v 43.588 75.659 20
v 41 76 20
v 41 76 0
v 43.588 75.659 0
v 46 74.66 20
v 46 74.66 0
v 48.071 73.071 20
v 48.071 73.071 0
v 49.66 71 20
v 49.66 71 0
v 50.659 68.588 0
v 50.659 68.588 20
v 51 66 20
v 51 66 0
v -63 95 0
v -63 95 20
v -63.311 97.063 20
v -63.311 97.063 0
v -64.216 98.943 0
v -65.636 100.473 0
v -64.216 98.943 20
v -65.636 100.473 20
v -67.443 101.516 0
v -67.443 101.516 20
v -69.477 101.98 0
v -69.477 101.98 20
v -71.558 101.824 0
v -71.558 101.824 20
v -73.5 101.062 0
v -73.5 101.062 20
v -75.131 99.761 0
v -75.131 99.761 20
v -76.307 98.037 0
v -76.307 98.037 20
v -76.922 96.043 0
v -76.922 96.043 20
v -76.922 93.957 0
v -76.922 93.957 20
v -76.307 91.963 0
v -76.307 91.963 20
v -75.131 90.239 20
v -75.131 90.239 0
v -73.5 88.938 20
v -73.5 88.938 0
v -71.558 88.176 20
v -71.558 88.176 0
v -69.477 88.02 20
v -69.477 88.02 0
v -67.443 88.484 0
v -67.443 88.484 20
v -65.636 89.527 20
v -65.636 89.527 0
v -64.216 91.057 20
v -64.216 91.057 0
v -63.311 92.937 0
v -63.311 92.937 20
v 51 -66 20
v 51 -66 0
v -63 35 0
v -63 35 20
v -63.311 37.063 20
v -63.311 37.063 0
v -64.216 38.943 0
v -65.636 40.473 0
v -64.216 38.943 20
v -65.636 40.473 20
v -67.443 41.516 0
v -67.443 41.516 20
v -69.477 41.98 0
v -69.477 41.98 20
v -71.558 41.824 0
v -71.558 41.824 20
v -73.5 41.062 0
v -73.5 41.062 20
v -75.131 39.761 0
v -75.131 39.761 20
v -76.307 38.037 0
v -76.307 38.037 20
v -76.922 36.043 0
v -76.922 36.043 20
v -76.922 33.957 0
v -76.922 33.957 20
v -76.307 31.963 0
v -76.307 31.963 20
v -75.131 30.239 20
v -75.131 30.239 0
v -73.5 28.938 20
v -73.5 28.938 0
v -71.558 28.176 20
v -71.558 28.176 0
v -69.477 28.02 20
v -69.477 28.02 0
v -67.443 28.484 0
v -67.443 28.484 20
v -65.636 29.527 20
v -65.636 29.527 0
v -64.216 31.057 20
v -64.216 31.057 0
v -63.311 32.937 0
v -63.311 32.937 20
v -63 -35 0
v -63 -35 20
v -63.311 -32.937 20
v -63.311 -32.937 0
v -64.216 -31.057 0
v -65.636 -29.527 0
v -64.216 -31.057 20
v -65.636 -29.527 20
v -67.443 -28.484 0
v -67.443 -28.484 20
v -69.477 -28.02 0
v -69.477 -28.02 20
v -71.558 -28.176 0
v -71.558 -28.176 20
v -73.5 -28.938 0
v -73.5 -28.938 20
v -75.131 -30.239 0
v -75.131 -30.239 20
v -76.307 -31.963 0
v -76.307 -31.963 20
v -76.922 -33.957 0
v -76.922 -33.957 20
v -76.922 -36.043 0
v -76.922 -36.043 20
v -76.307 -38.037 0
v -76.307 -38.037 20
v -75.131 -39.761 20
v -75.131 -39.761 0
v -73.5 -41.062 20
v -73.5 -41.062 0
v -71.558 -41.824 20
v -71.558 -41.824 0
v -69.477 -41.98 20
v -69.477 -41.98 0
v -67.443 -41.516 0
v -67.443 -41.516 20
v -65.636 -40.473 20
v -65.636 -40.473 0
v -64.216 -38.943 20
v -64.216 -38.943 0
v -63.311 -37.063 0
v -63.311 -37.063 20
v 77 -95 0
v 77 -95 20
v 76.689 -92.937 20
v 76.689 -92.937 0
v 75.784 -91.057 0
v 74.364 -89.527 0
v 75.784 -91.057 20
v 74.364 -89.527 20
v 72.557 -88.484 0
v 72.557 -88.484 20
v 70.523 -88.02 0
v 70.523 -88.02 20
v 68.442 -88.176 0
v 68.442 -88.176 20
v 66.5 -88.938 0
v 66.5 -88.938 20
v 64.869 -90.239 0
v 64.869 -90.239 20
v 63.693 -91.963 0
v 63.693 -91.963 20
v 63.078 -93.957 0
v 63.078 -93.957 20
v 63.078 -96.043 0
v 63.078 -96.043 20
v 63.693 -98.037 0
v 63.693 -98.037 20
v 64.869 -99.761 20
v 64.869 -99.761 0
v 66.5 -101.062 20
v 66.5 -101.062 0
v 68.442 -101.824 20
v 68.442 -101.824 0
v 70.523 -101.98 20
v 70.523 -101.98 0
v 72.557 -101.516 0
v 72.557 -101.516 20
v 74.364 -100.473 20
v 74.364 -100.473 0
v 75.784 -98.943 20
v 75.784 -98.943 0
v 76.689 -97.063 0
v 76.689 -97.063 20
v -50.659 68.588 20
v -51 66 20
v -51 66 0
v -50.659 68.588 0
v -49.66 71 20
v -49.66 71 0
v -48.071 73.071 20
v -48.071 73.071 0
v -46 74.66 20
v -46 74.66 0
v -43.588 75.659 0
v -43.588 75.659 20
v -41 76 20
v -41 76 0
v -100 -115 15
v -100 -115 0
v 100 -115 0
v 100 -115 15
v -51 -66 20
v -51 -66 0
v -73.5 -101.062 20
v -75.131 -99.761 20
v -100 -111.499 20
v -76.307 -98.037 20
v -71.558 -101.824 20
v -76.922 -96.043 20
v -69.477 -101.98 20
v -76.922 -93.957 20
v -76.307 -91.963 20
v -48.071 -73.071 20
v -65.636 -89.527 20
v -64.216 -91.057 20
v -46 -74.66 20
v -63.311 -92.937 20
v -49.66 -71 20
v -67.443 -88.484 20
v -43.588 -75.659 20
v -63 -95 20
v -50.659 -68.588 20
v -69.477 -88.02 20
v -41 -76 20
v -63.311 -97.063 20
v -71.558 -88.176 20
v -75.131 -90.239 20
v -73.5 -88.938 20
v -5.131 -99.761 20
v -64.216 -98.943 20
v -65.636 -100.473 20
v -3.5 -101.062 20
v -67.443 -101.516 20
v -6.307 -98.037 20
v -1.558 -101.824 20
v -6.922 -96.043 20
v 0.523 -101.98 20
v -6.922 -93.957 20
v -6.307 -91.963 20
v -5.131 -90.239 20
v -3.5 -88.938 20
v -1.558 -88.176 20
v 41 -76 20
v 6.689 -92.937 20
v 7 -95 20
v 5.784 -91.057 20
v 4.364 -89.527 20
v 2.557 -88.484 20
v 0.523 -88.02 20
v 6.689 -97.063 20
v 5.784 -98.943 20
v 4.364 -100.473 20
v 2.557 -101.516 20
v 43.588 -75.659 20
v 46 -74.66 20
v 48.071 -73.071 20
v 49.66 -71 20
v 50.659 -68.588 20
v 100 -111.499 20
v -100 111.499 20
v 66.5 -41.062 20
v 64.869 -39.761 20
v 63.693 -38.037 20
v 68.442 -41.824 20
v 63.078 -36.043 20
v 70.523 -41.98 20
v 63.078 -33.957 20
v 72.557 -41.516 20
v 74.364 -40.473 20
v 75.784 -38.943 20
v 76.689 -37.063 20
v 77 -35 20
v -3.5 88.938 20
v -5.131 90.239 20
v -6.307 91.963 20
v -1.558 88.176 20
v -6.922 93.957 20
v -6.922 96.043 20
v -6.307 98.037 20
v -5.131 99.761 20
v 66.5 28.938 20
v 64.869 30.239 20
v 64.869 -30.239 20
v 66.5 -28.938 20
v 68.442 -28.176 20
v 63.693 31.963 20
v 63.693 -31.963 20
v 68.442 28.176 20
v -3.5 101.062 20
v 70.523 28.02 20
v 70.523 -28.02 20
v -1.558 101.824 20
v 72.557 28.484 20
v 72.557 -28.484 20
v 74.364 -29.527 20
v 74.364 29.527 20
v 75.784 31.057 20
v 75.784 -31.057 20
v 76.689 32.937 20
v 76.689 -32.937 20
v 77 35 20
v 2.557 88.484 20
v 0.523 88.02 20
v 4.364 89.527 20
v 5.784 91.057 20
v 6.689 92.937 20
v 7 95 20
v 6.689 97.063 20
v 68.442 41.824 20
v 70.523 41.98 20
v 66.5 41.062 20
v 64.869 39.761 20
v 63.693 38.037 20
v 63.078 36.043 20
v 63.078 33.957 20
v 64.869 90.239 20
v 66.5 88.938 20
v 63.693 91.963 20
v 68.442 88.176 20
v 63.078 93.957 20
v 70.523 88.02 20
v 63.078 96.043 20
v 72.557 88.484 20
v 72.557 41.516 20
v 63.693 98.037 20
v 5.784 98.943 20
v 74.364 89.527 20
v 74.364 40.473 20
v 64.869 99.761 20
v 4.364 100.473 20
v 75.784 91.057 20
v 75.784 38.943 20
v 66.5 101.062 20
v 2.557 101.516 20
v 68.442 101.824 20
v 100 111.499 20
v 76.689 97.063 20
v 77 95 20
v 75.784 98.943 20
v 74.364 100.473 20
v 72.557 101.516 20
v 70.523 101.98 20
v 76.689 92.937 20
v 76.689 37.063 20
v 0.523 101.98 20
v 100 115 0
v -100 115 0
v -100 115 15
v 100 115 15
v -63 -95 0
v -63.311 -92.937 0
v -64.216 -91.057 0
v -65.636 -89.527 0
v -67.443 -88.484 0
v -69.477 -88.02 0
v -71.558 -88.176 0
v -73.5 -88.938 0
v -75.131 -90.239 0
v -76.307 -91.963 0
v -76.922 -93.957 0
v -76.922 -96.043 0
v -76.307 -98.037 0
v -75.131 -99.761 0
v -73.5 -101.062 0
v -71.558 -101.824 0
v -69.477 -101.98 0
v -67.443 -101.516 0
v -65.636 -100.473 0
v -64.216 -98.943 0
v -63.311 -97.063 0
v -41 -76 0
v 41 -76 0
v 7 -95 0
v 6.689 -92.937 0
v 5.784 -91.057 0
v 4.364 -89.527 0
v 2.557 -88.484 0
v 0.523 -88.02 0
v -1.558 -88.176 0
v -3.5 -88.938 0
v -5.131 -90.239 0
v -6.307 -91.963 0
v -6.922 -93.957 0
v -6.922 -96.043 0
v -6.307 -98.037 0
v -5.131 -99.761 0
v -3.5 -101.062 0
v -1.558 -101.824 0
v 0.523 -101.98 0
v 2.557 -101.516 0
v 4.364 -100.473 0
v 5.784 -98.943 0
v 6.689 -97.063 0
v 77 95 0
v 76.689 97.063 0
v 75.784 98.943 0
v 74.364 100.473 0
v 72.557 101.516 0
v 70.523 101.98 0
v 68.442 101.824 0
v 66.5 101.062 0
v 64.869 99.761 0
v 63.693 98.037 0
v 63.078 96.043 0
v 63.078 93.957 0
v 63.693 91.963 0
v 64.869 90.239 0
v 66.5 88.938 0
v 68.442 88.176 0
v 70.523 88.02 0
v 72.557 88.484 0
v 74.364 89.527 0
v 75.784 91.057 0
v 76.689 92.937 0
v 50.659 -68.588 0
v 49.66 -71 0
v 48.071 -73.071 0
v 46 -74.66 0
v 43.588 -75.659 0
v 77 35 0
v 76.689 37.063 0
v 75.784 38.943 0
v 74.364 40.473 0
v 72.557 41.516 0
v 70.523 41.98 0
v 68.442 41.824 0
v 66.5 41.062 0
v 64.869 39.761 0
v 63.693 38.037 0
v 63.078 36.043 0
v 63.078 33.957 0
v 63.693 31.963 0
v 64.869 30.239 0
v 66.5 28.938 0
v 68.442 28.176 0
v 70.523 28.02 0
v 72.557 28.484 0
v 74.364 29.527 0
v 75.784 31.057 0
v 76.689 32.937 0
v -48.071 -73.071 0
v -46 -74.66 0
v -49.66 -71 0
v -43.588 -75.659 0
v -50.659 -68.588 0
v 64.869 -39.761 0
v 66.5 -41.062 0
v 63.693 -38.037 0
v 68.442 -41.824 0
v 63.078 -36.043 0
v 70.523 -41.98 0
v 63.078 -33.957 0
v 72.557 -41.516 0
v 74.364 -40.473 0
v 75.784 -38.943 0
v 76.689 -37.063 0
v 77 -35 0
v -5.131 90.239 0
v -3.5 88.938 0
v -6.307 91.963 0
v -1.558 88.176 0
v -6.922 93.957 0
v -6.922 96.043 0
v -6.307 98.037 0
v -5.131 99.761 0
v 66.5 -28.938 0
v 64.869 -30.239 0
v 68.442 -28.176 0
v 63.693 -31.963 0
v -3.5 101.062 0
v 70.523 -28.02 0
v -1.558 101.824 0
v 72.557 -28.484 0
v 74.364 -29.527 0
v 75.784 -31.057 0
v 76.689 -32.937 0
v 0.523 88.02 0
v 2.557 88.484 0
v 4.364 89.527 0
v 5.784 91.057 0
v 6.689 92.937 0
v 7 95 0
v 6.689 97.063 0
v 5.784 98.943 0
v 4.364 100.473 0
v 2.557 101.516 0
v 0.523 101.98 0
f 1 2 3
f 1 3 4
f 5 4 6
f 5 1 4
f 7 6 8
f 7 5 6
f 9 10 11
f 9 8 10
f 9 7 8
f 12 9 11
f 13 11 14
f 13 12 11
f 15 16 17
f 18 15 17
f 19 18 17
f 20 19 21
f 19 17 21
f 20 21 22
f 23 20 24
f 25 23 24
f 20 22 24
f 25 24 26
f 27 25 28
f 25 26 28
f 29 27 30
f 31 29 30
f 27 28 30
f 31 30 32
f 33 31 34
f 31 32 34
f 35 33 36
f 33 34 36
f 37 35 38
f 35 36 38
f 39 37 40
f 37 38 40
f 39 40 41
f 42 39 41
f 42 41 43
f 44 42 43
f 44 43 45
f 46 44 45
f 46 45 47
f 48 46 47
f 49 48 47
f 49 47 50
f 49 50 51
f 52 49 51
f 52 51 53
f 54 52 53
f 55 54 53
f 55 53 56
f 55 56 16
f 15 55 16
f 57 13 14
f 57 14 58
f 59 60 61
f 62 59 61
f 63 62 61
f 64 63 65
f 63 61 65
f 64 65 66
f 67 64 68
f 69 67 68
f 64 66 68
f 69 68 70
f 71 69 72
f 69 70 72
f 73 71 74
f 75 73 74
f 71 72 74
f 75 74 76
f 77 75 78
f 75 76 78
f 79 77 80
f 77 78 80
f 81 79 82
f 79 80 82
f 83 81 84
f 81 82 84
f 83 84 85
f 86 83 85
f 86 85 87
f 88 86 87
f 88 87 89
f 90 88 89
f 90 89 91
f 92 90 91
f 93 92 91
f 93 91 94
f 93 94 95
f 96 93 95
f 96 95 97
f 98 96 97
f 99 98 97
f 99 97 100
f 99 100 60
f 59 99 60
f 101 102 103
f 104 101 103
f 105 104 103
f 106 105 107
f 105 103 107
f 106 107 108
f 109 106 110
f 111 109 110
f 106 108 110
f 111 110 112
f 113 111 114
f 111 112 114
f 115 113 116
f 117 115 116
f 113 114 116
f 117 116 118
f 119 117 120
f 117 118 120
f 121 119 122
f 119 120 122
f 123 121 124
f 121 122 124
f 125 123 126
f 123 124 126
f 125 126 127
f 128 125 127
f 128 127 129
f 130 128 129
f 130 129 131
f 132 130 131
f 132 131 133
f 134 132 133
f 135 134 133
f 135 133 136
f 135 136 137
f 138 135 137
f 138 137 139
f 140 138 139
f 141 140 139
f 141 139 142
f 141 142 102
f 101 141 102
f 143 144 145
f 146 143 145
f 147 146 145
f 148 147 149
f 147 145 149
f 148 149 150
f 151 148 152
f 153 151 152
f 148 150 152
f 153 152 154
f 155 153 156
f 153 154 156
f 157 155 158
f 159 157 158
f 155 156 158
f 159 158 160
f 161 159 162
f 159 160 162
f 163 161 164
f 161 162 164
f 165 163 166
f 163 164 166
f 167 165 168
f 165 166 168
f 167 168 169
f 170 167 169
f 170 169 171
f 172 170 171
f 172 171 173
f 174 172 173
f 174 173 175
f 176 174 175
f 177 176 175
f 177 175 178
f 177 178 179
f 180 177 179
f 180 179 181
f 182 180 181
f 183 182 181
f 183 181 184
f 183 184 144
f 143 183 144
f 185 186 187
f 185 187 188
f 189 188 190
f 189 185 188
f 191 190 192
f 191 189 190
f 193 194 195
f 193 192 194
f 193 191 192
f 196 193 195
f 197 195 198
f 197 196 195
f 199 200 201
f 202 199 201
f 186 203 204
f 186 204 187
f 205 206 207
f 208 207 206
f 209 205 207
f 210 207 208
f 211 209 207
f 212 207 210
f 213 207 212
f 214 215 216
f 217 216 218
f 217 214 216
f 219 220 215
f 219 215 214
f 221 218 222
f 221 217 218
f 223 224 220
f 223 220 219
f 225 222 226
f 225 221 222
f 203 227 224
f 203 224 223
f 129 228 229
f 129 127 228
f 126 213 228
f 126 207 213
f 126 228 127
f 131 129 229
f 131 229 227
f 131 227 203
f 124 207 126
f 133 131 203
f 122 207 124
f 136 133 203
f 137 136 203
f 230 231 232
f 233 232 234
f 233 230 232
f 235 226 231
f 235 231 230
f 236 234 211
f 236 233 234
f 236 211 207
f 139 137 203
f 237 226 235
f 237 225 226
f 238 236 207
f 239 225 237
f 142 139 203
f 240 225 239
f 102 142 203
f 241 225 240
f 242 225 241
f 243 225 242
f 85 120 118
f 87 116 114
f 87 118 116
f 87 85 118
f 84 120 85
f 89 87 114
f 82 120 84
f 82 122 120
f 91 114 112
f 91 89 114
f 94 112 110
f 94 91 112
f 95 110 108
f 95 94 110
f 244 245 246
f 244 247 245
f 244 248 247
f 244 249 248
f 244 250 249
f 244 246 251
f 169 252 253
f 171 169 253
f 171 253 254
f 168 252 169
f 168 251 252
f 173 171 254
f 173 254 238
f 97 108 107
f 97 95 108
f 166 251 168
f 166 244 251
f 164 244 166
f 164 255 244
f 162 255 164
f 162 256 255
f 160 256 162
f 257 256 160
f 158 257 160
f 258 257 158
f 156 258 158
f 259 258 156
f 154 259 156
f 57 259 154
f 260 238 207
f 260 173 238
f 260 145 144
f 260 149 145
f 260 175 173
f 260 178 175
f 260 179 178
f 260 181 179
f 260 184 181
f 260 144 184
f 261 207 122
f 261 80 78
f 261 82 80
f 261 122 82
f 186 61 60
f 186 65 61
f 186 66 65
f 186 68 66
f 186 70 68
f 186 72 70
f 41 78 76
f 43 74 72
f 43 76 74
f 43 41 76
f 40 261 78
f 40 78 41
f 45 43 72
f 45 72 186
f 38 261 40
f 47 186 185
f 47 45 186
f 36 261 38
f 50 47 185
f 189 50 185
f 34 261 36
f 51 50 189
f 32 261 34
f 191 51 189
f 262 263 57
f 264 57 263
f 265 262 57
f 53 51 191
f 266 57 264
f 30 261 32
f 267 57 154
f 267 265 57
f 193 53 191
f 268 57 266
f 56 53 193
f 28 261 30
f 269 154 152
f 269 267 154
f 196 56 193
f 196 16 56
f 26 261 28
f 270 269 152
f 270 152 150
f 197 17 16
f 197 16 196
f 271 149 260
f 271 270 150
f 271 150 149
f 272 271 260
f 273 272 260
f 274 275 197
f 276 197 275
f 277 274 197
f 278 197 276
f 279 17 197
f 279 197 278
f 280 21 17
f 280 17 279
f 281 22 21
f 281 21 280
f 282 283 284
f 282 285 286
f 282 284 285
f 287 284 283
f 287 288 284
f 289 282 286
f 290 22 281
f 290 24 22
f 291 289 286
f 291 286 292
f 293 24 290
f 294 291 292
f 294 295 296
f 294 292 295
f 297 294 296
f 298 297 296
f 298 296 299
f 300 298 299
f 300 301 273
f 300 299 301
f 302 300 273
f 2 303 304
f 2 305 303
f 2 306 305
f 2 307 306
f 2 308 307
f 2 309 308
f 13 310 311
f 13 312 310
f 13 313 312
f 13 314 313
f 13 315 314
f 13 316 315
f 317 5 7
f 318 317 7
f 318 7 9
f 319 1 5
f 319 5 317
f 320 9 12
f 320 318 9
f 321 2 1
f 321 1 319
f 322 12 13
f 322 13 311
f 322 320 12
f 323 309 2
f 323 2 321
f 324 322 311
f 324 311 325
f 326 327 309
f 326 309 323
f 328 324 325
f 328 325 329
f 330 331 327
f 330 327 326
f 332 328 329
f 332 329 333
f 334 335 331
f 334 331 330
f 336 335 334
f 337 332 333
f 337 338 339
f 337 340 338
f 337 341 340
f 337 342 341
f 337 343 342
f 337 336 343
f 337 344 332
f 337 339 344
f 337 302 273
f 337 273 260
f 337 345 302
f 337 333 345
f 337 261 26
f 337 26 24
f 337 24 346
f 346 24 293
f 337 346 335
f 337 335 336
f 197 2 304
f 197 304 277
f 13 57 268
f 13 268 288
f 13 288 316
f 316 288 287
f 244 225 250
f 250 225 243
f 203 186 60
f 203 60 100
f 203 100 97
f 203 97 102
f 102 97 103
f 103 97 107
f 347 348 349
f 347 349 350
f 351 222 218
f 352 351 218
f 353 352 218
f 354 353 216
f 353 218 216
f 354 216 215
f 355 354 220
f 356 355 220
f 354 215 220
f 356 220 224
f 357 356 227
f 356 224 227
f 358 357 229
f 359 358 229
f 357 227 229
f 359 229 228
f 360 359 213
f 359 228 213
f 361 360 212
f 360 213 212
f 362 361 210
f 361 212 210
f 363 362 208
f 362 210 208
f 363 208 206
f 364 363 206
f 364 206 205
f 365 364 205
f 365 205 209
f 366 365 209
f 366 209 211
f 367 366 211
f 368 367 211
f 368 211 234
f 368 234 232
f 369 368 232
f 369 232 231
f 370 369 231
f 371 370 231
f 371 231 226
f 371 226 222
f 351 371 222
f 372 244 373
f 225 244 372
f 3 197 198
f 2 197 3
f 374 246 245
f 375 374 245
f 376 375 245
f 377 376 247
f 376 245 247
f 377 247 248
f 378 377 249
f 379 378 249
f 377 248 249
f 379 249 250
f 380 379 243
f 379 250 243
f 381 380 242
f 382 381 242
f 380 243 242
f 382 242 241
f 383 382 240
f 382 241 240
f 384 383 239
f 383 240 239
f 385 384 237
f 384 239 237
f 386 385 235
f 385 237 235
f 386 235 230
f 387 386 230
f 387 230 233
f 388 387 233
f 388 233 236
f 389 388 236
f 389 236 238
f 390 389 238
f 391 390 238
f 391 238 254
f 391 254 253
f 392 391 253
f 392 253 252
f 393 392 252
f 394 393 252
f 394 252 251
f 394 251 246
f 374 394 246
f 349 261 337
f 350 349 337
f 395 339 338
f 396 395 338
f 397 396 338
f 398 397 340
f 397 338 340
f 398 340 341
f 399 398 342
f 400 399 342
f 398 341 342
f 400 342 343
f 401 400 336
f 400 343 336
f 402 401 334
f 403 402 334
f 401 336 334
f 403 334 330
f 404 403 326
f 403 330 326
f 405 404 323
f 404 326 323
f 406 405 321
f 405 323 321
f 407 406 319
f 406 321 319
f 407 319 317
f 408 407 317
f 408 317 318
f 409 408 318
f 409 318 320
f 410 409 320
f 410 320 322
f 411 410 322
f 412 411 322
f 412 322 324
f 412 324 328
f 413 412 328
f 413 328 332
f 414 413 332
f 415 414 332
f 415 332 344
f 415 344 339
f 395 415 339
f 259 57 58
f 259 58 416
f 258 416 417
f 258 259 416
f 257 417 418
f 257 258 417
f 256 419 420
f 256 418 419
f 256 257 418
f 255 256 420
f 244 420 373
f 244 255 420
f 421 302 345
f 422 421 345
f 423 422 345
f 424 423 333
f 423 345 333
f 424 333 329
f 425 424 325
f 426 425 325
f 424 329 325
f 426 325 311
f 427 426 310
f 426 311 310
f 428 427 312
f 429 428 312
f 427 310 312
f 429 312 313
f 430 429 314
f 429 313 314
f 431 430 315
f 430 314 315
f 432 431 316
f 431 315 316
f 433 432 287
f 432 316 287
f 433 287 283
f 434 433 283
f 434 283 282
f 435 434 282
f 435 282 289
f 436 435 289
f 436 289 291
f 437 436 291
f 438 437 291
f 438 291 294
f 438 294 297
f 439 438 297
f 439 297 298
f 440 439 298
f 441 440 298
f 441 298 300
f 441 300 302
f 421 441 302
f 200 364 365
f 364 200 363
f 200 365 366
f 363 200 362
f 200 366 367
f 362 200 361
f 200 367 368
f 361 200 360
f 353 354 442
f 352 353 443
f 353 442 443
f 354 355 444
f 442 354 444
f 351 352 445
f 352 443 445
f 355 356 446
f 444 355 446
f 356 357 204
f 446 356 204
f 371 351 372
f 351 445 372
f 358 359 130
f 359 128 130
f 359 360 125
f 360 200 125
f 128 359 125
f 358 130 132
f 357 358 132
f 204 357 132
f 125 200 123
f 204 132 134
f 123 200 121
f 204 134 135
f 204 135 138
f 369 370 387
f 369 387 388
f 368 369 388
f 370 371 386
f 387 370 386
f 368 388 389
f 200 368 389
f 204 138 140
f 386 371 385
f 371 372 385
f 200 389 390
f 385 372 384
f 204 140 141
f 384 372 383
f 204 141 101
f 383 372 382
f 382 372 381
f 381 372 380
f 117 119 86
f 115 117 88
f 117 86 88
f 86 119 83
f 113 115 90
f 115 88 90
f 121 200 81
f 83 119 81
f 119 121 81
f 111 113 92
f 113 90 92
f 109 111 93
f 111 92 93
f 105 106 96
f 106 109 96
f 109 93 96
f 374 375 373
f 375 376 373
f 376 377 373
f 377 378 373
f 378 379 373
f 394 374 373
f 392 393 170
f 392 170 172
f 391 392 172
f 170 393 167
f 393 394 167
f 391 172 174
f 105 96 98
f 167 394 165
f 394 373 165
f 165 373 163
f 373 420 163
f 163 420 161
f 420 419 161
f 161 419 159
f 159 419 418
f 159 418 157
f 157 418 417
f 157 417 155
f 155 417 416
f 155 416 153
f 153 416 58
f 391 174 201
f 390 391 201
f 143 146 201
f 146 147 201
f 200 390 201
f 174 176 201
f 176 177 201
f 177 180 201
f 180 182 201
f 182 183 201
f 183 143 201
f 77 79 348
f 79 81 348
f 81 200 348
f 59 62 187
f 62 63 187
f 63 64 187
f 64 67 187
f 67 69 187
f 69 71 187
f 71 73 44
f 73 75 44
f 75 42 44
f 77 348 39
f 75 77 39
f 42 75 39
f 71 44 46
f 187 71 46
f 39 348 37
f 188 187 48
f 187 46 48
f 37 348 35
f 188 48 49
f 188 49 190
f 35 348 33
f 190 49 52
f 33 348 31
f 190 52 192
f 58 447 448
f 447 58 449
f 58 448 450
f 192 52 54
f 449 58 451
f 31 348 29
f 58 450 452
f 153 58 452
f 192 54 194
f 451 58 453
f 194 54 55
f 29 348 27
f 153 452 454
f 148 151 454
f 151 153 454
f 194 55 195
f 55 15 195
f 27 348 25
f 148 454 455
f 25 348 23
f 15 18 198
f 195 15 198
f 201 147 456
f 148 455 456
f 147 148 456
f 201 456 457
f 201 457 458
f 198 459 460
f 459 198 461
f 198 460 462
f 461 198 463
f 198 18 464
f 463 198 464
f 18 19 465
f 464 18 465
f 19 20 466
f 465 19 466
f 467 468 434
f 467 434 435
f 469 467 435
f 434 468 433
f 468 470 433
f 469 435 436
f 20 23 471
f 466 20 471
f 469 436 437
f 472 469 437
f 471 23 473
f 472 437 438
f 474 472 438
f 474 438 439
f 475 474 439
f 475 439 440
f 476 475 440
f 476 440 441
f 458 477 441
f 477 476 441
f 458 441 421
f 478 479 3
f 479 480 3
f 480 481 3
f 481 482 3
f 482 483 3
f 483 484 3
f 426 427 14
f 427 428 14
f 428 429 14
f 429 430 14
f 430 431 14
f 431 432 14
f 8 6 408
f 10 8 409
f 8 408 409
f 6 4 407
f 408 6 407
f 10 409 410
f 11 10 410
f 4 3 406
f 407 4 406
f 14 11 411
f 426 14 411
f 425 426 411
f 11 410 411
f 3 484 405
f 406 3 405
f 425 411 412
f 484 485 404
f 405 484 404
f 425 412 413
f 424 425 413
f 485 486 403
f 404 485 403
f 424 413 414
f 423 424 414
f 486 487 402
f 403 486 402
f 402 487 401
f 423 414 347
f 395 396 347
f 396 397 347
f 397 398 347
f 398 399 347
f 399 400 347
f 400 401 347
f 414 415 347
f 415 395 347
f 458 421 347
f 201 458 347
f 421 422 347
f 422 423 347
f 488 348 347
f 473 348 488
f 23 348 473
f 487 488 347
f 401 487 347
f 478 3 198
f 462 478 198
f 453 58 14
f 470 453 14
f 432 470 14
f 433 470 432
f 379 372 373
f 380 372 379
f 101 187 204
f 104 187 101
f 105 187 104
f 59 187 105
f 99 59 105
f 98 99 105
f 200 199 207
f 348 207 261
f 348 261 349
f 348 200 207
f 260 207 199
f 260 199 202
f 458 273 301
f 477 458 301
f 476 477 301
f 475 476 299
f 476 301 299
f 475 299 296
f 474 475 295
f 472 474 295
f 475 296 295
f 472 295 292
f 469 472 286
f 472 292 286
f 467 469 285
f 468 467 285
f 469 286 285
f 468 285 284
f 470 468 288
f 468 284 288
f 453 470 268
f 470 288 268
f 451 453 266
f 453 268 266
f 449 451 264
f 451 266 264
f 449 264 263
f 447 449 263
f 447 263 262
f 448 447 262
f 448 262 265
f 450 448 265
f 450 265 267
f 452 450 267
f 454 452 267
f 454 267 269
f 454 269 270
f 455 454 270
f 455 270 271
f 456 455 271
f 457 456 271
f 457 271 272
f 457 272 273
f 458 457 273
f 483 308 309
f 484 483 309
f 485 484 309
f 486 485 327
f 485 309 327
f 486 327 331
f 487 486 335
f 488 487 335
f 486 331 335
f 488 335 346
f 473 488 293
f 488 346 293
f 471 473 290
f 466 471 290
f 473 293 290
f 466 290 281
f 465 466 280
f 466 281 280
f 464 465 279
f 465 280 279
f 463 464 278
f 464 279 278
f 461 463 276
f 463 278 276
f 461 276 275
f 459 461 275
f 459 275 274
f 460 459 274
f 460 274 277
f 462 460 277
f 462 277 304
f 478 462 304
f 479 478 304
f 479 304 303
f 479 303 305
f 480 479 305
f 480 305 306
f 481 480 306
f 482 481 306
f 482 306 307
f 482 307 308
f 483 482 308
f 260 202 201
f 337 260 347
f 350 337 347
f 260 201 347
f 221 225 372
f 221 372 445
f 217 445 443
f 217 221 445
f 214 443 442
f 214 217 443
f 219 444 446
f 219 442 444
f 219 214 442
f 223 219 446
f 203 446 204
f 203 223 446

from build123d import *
from OCP.BRepFilletAPI import BRepFilletAPI_MakeChamfer

# Parameters (mm, degrees)
SKETCH_1_W          = 200
SKETCH_1_H          = 230
EXTRUDE_1_DEPTH     = 20
CUT_EXTRUDE_1_REACH = 155.704
SKETCH_2_R          = 7
CHAMFER_1_SIZE      = 5
CHAMFER_1_SIZE2     = 3.501037691


with BuildPart() as part:
    # 草图1 → 凸台-拉伸1 (new body)
    with BuildSketch(Plane.XY):
        Rectangle(SKETCH_1_W, SKETCH_1_H)
    extrude(amount=EXTRUDE_1_DEPTH)

    # 草图2 → 切除-拉伸1 (cut, up to next)
    with BuildSketch(Plane.XY.offset(20), mode=Mode.PRIVATE) as cut_extrude_1_sk1:
        with Locations((-70, 95)):
            Circle(SKETCH_2_R)
    cut_extrude_1_tool1 = extrude(cut_extrude_1_sk1.sketch, amount=-CUT_EXTRUDE_1_REACH, mode=Mode.PRIVATE) & part.part
    # 草图2 → 切除-拉伸1 (cut, up to next)
    with BuildSketch(Plane.XY.offset(20), mode=Mode.PRIVATE) as cut_extrude_1_sk2:
        with Locations((0, 95)):
            Circle(SKETCH_2_R)
    cut_extrude_1_tool2 = extrude(cut_extrude_1_sk2.sketch, amount=-CUT_EXTRUDE_1_REACH, mode=Mode.PRIVATE) & part.part
    # 草图2 → 切除-拉伸1 (cut, up to next)
    with BuildSketch(Plane.XY.offset(20), mode=Mode.PRIVATE) as cut_extrude_1_sk3:
        with Locations((70, 95)):
            Circle(SKETCH_2_R)
    cut_extrude_1_tool3 = extrude(cut_extrude_1_sk3.sketch, amount=-CUT_EXTRUDE_1_REACH, mode=Mode.PRIVATE) & part.part
    # 草图2 → 切除-拉伸1 (cut, up to next)
    with BuildSketch(Plane.XY.offset(20), mode=Mode.PRIVATE) as cut_extrude_1_sk4:
        with Locations((-70, 35)):
            Circle(SKETCH_2_R)
    cut_extrude_1_tool4 = extrude(cut_extrude_1_sk4.sketch, amount=-CUT_EXTRUDE_1_REACH, mode=Mode.PRIVATE) & part.part
    # 草图2 → 切除-拉伸1 (cut, up to next)
    with BuildSketch(Plane.XY.offset(20), mode=Mode.PRIVATE) as cut_extrude_1_sk5:
        with Locations((70, 35)):
            Circle(SKETCH_2_R)
    cut_extrude_1_tool5 = extrude(cut_extrude_1_sk5.sketch, amount=-CUT_EXTRUDE_1_REACH, mode=Mode.PRIVATE) & part.part
    # 草图2 → 切除-拉伸1 (cut, up to next)
    with BuildSketch(Plane.XY.offset(20), mode=Mode.PRIVATE) as cut_extrude_1_sk6:
        with Locations((-70, -35)):
            Circle(SKETCH_2_R)
    cut_extrude_1_tool6 = extrude(cut_extrude_1_sk6.sketch, amount=-CUT_EXTRUDE_1_REACH, mode=Mode.PRIVATE) & part.part
    # 草图2 → 切除-拉伸1 (cut, up to next)
    with BuildSketch(Plane.XY.offset(20), mode=Mode.PRIVATE) as cut_extrude_1_sk7:
        with Locations((0, -95)):
            Circle(SKETCH_2_R)
    cut_extrude_1_tool7 = extrude(cut_extrude_1_sk7.sketch, amount=-CUT_EXTRUDE_1_REACH, mode=Mode.PRIVATE) & part.part
    # 草图2 → 切除-拉伸1 (cut, up to next)
    with BuildSketch(Plane.XY.offset(20), mode=Mode.PRIVATE) as cut_extrude_1_sk8:
        with Locations((-70, -95)):
            Circle(SKETCH_2_R)
    cut_extrude_1_tool8 = extrude(cut_extrude_1_sk8.sketch, amount=-CUT_EXTRUDE_1_REACH, mode=Mode.PRIVATE) & part.part
    # 草图2 → 切除-拉伸1 (cut, up to next)
    with BuildSketch(Plane.XY.offset(20), mode=Mode.PRIVATE) as cut_extrude_1_sk9:
        with Locations((70, -35)):
            Circle(SKETCH_2_R)
    cut_extrude_1_tool9 = extrude(cut_extrude_1_sk9.sketch, amount=-CUT_EXTRUDE_1_REACH, mode=Mode.PRIVATE) & part.part
    # 草图2 → 切除-拉伸1 (cut, up to next)
    with BuildSketch(Plane.XY.offset(20), mode=Mode.PRIVATE) as cut_extrude_1_sk10:
        with Locations((70, -95)):
            Circle(SKETCH_2_R)
    cut_extrude_1_tool10 = extrude(cut_extrude_1_sk10.sketch, amount=-CUT_EXTRUDE_1_REACH, mode=Mode.PRIVATE) & part.part
    # 草图2 → 切除-拉伸1 (cut, up to next)
    with BuildSketch(Plane.XY.offset(20), mode=Mode.PRIVATE) as cut_extrude_1_sk11:
        with BuildLine():
            Line((-41, 76), (41, 76))
            ThreePointArc((41, 76), (48.071067812, 73.071067812), (51, 66))
            Line((51, 66), (51, -66))
            ThreePointArc((51, -66), (48.071067812, -73.071067812), (41, -76))
            Line((41, -76), (-41, -76))
            ThreePointArc((-41, -76), (-48.071067812, -73.071067812), (-51, -66))
            Line((-51, -66), (-51, 66))
            ThreePointArc((-51, 66), (-48.071067812, 73.071067812), (-41, 76))
        make_face()
    cut_extrude_1_tool11 = extrude(cut_extrude_1_sk11.sketch, amount=-CUT_EXTRUDE_1_REACH, mode=Mode.PRIVATE) & part.part
    add(cut_extrude_1_tool1.solids().sort_by_distance((-70, 95, 20))[0], mode=Mode.SUBTRACT)
    add(cut_extrude_1_tool2.solids().sort_by_distance((0, 95, 20))[0], mode=Mode.SUBTRACT)
    add(cut_extrude_1_tool3.solids().sort_by_distance((70, 95, 20))[0], mode=Mode.SUBTRACT)
    add(cut_extrude_1_tool4.solids().sort_by_distance((-70, 35, 20))[0], mode=Mode.SUBTRACT)
    add(cut_extrude_1_tool5.solids().sort_by_distance((70, 35, 20))[0], mode=Mode.SUBTRACT)
    add(cut_extrude_1_tool6.solids().sort_by_distance((-70, -35, 20))[0], mode=Mode.SUBTRACT)
    add(cut_extrude_1_tool7.solids().sort_by_distance((0, -95, 20))[0], mode=Mode.SUBTRACT)
    add(cut_extrude_1_tool8.solids().sort_by_distance((-70, -95, 20))[0], mode=Mode.SUBTRACT)
    add(cut_extrude_1_tool9.solids().sort_by_distance((70, -35, 20))[0], mode=Mode.SUBTRACT)
    add(cut_extrude_1_tool10.solids().sort_by_distance((70, -95, 20))[0], mode=Mode.SUBTRACT)
    add(cut_extrude_1_tool11.solids().sort_by_distance((0, 0, 20))[0], mode=Mode.SUBTRACT)

    # 倒角1: one chamfer whose edges measure the first distance from different faces: ONE call of the kernel's chamfer builder (chamfer() names one face for all edges)
    chamfer_1_edges_1 = [part.edges().sort_by_distance(p)[0] for p in [
        (0, -115, 20),
    ]]
    chamfer_1_side_1 = [part.faces().sort_by_distance(p)[0] for p in [
        (0, -115, 10),
    ]]
    chamfer_1_edges_2 = [part.edges().sort_by_distance(p)[0] for p in [
        (0, 115, 20),
    ]]
    chamfer_1_side_2 = [part.faces().sort_by_distance(p)[0] for p in [
        (0, 115, 10),
    ]]
    chamfer_1 = BRepFilletAPI_MakeChamfer(part.part.solid().wrapped)
    for e in chamfer_1_edges_1:
        chamfer_1.Add(CHAMFER_1_SIZE, CHAMFER_1_SIZE2, e.wrapped, chamfer_1_side_1[0].wrapped)  # the first distance lies on this face
    for e in chamfer_1_edges_2:
        chamfer_1.Add(CHAMFER_1_SIZE, CHAMFER_1_SIZE2, e.wrapped, chamfer_1_side_2[0].wrapped)  # the first distance lies on this face
    add(Compound.cast(chamfer_1.Shape()), mode=Mode.REPLACE)


solid = part.part
